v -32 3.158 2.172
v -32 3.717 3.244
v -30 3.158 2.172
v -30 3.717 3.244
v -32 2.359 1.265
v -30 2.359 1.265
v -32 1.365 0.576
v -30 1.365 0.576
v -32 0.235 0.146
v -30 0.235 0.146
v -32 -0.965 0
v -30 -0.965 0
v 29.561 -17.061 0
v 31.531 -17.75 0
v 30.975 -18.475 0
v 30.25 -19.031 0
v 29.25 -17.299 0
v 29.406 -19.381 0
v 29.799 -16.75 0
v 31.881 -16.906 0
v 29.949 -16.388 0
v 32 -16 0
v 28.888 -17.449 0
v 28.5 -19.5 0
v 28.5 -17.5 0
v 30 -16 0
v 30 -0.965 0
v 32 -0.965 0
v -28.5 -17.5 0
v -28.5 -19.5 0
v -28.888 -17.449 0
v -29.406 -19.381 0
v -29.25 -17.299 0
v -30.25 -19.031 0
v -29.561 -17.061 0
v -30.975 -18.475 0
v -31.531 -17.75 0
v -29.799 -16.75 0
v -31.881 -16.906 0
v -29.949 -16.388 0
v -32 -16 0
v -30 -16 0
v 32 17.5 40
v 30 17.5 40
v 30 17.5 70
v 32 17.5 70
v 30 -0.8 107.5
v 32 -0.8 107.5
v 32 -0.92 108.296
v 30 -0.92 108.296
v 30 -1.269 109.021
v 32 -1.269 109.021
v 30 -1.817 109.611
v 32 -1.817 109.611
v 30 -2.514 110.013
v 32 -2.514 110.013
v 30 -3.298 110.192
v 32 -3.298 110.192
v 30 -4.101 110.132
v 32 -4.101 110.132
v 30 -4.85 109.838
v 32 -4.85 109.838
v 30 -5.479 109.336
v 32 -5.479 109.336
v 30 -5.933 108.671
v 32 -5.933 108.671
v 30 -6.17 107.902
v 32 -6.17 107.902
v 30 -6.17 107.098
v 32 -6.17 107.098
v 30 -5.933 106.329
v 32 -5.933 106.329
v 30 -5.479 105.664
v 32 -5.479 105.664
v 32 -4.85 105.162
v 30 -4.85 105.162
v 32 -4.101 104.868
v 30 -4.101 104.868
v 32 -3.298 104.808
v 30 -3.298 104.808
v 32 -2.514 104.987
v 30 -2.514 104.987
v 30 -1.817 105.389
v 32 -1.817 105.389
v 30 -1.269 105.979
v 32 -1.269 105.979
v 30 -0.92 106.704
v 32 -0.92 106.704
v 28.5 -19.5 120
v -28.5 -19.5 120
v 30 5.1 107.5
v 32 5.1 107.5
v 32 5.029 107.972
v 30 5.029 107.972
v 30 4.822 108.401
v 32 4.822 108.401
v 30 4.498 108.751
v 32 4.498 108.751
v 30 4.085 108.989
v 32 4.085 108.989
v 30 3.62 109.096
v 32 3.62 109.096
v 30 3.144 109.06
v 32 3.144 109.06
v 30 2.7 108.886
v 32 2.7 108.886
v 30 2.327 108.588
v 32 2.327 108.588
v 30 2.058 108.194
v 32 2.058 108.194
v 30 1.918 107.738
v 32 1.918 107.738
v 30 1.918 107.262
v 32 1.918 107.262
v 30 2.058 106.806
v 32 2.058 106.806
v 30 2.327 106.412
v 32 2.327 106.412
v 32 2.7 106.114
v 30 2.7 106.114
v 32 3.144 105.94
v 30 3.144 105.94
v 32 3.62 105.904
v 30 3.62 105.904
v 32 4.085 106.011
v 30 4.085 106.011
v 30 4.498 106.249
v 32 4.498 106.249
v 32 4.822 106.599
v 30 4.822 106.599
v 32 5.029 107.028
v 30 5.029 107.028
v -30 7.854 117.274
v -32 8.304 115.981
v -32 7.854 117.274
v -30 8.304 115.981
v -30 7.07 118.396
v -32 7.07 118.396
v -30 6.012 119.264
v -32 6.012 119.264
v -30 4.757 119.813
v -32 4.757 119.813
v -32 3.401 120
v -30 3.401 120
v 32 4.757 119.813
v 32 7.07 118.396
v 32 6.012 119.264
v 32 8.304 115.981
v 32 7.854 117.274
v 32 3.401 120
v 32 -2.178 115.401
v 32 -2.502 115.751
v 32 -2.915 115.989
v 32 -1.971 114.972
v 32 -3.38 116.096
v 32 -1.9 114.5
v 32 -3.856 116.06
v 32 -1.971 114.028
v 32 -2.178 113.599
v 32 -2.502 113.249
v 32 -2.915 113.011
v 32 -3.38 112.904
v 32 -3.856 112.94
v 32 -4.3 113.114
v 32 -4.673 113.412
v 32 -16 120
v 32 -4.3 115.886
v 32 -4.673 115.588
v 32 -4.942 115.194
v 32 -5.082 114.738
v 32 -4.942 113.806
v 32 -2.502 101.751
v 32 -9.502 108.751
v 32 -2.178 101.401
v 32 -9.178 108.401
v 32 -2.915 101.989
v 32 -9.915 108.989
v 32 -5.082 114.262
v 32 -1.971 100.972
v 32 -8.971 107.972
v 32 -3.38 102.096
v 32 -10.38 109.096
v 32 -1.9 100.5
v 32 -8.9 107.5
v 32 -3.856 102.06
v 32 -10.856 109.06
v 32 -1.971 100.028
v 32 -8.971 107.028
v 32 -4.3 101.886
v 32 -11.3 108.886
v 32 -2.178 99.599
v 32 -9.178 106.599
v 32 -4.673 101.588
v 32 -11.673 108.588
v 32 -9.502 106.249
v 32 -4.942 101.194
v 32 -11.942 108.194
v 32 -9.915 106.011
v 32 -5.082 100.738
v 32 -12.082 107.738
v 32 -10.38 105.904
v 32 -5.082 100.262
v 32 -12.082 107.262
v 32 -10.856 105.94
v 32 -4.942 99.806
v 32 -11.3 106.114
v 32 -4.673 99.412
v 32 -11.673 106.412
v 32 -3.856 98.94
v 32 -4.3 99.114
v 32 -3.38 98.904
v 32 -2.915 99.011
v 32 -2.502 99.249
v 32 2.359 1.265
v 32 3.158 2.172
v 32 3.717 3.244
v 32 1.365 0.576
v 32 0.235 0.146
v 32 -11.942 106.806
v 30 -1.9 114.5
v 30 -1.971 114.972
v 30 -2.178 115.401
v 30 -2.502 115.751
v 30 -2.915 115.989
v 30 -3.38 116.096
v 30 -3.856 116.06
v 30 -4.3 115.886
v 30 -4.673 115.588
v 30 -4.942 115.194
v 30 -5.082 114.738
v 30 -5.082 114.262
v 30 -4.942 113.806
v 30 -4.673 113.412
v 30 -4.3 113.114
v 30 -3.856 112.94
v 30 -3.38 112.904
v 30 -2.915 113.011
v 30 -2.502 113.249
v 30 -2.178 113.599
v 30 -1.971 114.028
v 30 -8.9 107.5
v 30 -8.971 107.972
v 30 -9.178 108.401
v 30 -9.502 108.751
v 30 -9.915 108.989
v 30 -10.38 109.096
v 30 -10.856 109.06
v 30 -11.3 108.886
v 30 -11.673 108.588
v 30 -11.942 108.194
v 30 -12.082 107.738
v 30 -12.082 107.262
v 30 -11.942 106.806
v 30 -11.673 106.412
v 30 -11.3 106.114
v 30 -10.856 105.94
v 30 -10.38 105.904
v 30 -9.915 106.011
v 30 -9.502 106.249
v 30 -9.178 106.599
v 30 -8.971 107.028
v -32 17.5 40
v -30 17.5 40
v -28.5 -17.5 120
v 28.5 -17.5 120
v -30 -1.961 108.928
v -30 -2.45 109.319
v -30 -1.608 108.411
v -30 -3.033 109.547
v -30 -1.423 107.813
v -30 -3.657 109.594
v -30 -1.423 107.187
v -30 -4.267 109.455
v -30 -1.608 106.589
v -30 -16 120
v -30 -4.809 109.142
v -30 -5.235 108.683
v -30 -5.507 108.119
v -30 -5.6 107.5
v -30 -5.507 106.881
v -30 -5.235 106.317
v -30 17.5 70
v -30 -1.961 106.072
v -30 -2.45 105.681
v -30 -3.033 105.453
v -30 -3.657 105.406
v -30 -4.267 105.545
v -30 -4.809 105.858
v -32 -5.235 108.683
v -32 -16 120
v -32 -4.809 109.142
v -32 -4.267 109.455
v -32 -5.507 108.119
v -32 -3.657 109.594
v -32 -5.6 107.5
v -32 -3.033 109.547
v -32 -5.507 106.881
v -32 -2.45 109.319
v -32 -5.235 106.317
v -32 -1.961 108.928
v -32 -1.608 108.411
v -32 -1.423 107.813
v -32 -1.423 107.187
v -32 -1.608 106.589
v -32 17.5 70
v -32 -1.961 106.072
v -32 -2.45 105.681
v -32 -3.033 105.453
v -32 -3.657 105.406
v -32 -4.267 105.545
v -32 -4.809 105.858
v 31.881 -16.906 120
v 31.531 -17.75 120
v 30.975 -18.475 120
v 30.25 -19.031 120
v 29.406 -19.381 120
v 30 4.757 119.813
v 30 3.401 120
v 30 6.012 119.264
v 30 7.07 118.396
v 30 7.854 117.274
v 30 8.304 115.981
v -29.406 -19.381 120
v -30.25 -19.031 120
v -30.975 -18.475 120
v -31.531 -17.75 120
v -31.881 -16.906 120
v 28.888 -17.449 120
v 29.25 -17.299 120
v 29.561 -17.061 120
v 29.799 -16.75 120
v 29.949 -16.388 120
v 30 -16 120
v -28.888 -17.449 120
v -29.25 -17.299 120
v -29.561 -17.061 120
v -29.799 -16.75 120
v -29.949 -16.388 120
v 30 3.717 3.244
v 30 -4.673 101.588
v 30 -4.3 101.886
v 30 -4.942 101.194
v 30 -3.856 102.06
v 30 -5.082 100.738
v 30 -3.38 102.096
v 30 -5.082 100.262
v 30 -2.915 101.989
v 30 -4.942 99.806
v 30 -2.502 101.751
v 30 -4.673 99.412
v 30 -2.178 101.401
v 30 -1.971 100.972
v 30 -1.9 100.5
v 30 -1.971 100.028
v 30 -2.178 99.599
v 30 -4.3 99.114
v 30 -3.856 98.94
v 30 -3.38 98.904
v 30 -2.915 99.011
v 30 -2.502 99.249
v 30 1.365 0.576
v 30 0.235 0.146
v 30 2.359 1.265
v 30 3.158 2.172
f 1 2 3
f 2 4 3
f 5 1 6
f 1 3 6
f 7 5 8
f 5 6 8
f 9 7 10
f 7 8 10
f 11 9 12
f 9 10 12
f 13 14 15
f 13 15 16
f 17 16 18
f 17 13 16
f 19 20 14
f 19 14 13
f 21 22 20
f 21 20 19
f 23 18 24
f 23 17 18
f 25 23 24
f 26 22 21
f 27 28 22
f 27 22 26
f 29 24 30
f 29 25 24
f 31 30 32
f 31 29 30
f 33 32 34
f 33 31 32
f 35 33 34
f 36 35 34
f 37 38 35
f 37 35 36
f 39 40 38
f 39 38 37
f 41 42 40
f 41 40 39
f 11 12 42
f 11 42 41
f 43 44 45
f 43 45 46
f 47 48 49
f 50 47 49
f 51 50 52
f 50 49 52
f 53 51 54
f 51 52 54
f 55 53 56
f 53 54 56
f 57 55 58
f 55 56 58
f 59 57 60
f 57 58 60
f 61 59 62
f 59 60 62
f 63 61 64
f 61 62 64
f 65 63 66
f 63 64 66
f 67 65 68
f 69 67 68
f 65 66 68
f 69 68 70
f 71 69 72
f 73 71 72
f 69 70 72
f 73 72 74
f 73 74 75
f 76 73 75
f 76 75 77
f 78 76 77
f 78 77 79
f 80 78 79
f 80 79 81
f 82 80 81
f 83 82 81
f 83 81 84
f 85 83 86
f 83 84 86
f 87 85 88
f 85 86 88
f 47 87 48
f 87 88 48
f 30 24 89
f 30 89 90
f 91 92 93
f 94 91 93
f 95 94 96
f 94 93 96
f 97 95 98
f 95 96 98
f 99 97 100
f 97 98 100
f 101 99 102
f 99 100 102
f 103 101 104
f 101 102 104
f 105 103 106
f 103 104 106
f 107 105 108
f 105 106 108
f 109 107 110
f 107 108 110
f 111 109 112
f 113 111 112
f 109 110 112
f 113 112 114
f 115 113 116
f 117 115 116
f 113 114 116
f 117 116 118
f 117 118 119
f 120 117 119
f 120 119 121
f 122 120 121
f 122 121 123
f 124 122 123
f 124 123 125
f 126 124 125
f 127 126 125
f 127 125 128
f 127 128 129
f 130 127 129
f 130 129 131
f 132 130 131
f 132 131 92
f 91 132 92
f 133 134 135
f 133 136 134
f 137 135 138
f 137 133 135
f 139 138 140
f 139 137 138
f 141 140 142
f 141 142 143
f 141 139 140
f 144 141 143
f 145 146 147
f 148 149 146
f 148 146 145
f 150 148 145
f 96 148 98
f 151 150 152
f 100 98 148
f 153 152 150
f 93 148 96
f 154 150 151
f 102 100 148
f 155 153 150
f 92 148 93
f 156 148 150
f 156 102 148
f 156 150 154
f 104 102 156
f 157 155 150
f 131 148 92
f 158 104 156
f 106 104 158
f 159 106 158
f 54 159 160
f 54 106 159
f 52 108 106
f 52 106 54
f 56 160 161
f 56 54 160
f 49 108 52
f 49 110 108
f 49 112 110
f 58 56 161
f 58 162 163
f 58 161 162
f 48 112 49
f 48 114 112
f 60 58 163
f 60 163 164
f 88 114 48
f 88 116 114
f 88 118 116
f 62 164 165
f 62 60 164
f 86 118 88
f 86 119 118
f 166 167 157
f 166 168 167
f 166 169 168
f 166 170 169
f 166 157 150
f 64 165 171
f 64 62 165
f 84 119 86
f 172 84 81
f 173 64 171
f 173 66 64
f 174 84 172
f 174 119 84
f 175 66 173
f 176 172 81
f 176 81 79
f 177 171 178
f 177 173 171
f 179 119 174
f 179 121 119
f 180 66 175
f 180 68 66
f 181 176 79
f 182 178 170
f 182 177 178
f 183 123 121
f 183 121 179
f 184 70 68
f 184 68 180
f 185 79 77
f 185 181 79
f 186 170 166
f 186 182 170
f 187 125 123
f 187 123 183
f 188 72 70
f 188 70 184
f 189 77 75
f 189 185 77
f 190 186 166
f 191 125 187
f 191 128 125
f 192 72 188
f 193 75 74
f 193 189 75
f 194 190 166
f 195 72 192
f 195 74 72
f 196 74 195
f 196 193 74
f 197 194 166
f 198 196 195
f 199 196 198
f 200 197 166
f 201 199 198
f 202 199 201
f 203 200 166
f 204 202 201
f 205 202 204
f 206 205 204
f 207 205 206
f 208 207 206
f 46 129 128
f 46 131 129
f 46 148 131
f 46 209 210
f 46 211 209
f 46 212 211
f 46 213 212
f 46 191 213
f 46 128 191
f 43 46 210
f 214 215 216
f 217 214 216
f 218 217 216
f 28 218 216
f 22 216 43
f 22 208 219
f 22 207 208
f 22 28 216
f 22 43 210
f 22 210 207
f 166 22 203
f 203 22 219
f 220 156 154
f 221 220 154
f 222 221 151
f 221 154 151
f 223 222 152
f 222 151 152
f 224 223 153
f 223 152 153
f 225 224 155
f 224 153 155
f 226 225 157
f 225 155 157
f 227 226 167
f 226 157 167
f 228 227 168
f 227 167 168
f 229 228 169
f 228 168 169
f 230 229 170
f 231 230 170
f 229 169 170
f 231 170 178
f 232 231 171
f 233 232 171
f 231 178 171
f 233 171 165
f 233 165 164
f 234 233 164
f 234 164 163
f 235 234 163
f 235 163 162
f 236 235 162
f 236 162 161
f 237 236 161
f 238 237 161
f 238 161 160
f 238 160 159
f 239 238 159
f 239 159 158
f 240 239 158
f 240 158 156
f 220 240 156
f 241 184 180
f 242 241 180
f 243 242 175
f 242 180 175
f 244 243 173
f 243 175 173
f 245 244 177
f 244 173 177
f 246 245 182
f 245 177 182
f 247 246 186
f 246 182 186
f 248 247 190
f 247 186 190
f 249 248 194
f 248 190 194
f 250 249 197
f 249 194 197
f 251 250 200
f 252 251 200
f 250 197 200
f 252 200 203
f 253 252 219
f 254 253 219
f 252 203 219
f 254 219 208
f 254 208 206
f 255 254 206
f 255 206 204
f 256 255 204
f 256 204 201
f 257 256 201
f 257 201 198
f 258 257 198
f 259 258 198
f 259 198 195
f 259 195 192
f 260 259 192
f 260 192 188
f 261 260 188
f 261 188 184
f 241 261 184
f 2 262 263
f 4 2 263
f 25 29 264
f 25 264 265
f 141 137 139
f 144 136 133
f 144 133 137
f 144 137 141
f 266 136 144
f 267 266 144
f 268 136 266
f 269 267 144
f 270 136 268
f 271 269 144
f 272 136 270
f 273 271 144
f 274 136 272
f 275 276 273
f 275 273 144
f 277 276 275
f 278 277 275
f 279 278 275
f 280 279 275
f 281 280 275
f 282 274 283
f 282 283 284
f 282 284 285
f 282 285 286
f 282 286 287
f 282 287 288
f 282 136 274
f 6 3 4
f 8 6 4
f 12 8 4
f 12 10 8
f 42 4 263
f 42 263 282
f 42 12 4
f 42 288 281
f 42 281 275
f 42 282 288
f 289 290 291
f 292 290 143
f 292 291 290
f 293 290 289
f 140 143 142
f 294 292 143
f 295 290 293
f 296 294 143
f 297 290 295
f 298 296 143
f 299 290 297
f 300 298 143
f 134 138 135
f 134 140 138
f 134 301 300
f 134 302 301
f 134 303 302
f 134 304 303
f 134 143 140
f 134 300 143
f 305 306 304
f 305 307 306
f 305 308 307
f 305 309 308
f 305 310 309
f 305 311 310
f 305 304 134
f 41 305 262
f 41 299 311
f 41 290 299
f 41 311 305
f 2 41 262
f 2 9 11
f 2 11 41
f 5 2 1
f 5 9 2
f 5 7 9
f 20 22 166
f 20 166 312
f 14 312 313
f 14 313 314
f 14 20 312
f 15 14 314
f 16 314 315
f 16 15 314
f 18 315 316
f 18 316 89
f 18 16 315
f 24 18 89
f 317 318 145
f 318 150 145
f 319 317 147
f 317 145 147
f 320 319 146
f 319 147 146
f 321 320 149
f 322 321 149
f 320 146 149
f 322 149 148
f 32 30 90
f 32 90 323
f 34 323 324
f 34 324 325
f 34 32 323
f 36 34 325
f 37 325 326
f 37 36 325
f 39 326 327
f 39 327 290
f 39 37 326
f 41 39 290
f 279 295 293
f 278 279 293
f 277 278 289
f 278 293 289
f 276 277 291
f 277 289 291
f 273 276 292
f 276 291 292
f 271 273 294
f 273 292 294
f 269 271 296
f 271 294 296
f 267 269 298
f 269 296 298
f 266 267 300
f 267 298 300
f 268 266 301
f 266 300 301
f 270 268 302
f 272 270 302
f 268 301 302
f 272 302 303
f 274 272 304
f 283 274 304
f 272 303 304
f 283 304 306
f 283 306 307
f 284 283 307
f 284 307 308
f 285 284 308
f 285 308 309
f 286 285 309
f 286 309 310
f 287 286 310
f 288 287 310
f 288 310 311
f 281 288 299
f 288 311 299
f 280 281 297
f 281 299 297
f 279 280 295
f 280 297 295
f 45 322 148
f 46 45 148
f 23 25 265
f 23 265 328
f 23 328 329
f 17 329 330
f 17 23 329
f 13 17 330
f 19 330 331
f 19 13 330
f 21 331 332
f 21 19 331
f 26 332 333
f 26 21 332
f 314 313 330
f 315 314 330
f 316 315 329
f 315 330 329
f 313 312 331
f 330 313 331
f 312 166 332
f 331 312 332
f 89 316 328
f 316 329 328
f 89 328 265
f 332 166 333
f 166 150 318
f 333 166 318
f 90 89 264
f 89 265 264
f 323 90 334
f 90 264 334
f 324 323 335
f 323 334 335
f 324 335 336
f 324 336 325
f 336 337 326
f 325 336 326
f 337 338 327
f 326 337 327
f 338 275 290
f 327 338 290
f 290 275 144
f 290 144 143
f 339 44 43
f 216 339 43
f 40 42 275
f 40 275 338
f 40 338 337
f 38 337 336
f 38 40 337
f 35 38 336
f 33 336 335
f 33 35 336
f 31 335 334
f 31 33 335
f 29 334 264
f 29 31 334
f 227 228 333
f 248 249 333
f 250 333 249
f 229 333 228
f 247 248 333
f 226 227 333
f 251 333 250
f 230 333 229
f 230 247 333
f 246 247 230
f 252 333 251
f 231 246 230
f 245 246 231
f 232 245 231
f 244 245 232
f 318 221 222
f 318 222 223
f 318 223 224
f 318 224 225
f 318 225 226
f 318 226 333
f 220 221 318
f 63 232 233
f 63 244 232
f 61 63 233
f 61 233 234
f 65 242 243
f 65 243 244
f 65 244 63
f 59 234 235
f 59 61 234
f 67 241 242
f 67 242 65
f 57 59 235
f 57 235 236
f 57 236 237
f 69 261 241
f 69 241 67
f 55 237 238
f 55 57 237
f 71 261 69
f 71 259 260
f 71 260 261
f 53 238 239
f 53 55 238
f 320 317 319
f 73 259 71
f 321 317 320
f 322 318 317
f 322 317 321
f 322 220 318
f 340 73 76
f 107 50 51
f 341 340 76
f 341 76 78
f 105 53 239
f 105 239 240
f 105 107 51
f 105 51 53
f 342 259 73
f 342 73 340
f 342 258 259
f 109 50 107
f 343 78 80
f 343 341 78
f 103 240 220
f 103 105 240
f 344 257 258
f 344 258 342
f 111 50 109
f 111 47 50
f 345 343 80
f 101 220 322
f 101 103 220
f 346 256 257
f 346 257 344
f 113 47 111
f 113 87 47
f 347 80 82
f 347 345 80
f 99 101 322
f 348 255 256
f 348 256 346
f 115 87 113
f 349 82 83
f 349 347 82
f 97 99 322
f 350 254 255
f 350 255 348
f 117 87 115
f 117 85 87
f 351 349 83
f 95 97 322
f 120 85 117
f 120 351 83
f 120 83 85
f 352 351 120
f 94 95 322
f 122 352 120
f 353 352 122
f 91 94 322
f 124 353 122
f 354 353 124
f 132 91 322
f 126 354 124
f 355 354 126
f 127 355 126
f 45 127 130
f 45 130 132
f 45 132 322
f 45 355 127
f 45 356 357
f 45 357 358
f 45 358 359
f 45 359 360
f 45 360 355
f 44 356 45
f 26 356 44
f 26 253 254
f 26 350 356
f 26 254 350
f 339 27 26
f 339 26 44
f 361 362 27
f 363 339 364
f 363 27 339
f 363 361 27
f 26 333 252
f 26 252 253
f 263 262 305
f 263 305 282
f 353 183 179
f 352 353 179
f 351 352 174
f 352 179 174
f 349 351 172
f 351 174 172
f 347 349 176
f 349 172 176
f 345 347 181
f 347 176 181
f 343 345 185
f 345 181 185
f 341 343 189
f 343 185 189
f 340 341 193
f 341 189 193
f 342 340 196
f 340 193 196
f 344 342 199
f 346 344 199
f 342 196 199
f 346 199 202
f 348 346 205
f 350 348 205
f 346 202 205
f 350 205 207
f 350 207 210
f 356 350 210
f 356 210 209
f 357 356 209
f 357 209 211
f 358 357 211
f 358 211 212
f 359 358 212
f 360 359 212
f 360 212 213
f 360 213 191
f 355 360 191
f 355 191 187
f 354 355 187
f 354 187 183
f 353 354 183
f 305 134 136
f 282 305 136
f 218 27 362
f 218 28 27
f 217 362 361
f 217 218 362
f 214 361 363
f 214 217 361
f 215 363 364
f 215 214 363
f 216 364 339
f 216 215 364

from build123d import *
from OCP.BRepFilletAPI import BRepFilletAPI_MakeChamfer

# Parameters (mm, degrees)
SM_BASE_FLANGE_1_DEPTH = 120
CUT_EXTRUDE_1_REACH    = 139.391
SKETCH_6_R             = 1.6
CHAMFER_1_SIZE         = 10
CHAMFER_1_SIZE2        = 50
SKETCH_7_R             = 2.7
CUT_EXTRUDE_2_DEPTH    = 2
SKETCH_9_R             = 2.1
CUT_EXTRUDE_3_DEPTH    = 2
CHAMFER_2_SIZE         = 40
CHAMFER_2_SIZE2        = 15
FILLET_1_R             = 5


# Sheet-metal steps are written as plain solids
with BuildPart() as part:
    # Sketch 1 → 基材-凸緣1 (new body)
    with BuildSketch(Plane.XY):
        with BuildLine():
            Line((-30, 17.5), (-30, -16))
            ThreePointArc((-30, -16), (-29.560660172, -17.060660172), (-28.5, -17.5))
            Line((-28.5, -17.5), (28.5, -17.5))
            ThreePointArc((28.5, -17.5), (29.560660172, -17.060660172), (30, -16))
            Line((30, -16), (30, 17.5))
            Line((30, 17.5), (32, 17.5))
            Line((32, 17.5), (32, -16))
            ThreePointArc((32, -16), (30.974873734, -18.474873734), (28.5, -19.5))
            Line((28.5, -19.5), (-28.5, -19.5))
            ThreePointArc((-28.5, -19.5), (-30.974873734, -18.474873734), (-32, -16))
            Line((-32, -16), (-32, 17.5))
            Line((-32, 17.5), (-30, 17.5))
        make_face()
    extrude(amount=SM_BASE_FLANGE_1_DEPTH)

    # 草圖6 → 除料-伸長1 (cut, up to next)
    with BuildSketch(Plane(origin=(32, 0, 0), x_dir=(0, 0, -1), z_dir=(1, 0, 0)), mode=Mode.PRIVATE) as cut_extrude_1_sk1:
        with Locations(Location((-107.5, 3.5, 0), (0, 0, 90))):
            Circle(SKETCH_6_R)
    cut_extrude_1_tool1 = extrude(cut_extrude_1_sk1.sketch, amount=-CUT_EXTRUDE_1_REACH, mode=Mode.PRIVATE) & part.part
    # 草圖6 → 除料-伸長1 (cut, up to next)
    with BuildSketch(Plane(origin=(32, 0, 0), x_dir=(0, 0, -1), z_dir=(1, 0, 0)), mode=Mode.PRIVATE) as cut_extrude_1_sk2:
        with Locations(Location((-100.5, -3.5, 0), (0, 0, 90))):
            Circle(SKETCH_6_R)
    cut_extrude_1_tool2 = extrude(cut_extrude_1_sk2.sketch, amount=-CUT_EXTRUDE_1_REACH, mode=Mode.PRIVATE) & part.part
    # 草圖6 → 除料-伸長1 (cut, up to next)
    with BuildSketch(Plane(origin=(32, 0, 0), x_dir=(0, 0, -1), z_dir=(1, 0, 0)), mode=Mode.PRIVATE) as cut_extrude_1_sk3:
        with Locations(Location((-107.5, -10.5, 0), (0, 0, 90))):
            Circle(SKETCH_6_R)
    cut_extrude_1_tool3 = extrude(cut_extrude_1_sk3.sketch, amount=-CUT_EXTRUDE_1_REACH, mode=Mode.PRIVATE) & part.part
    # 草圖6 → 除料-伸長1 (cut, up to next)
    with BuildSketch(Plane(origin=(32, 0, 0), x_dir=(0, 0, -1), z_dir=(1, 0, 0)), mode=Mode.PRIVATE) as cut_extrude_1_sk4:
        with Locations(Location((-114.5, -3.5, 0), (0, 0, 90))):
            Circle(SKETCH_6_R)
    cut_extrude_1_tool4 = extrude(cut_extrude_1_sk4.sketch, amount=-CUT_EXTRUDE_1_REACH, mode=Mode.PRIVATE) & part.part
    add(cut_extrude_1_tool1.solids().sort_by_distance((32, 3.5, 107.5))[0], mode=Mode.SUBTRACT)
    add(cut_extrude_1_tool2.solids().sort_by_distance((32, -3.5, 100.5))[0], mode=Mode.SUBTRACT)
    add(cut_extrude_1_tool3.solids().sort_by_distance((32, -10.5, 107.5))[0], mode=Mode.SUBTRACT)
    add(cut_extrude_1_tool4.solids().sort_by_distance((32, -3.5, 114.5))[0], mode=Mode.SUBTRACT)

    # 導角1
    chamfer_1_edges = [part.edges().sort_by_distance(p)[0] for p in [
        (-31, 17.5, 120),
        (31, 17.5, 120),
    ]]
    chamfer_1_side = [part.faces().sort_by_distance(p)[0] for p in [
        (-30.452140533, -17.952140533, 120),
    ]]
    chamfer(chamfer_1_edges, length=CHAMFER_1_SIZE, length2=CHAMFER_1_SIZE2, reference=chamfer_1_side[0])

    # 草圖7 → 除料-伸長2 (cut)
    with BuildSketch(Plane(origin=(32, 0, 0), x_dir=(0, 0, -1), z_dir=(1, 0, 0))):
        with Locations(Location((-107.5, -3.5, 0), (0, 0, 90))):
            Circle(SKETCH_7_R)
    extrude(amount=-CUT_EXTRUDE_2_DEPTH, mode=Mode.SUBTRACT)

    # 草圖9 → 除料-伸長3 (cut)
    with BuildSketch(Plane.ZY.offset(32)):
        with Locations(Location((107.5, -3.5, 0), (0, 0, 270))):
            Circle(SKETCH_9_R)
    extrude(amount=-CUT_EXTRUDE_3_DEPTH, mode=Mode.SUBTRACT)

    # 導角2: one chamfer whose edges measure the first distance from different faces: ONE call of the kernel's chamfer builder (chamfer() names one face for all edges)
    chamfer_2_edges_1 = [part.edges().sort_by_distance(p)[0] for p in [
        (-31, 17.5, 0),
    ]]
    chamfer_2_side_1 = [part.faces().sort_by_distance(p)[0] for p in [
        (-31, 17.5, 35),
    ]]
    chamfer_2_edges_2 = [part.edges().sort_by_distance(p)[0] for p in [
        (31, 17.5, 0),
    ]]
    chamfer_2_side_2 = [part.faces().sort_by_distance(p)[0] for p in [
        (31, 17.5, 35),
    ]]
    chamfer_2 = BRepFilletAPI_MakeChamfer(part.part.solid().wrapped)
    for e in chamfer_2_edges_1:
        chamfer_2.Add(CHAMFER_2_SIZE, CHAMFER_2_SIZE2, e.wrapped, chamfer_2_side_1[0].wrapped)  # the first distance lies on this face
    for e in chamfer_2_edges_2:
        chamfer_2.Add(CHAMFER_2_SIZE, CHAMFER_2_SIZE2, e.wrapped, chamfer_2_side_2[0].wrapped)  # the first distance lies on this face
    add(Compound.cast(chamfer_2.Shape()), mode=Mode.REPLACE)

    # 圓角1
    fillet_1_edges = [part.edges().sort_by_distance(p)[0] for p in [
        (-31, 2.5, 0),
        (31, 2.5, 0),
        (-31, 7.5, 120),
        (31, 7.5, 120),
    ]]
    fillet(fillet_1_edges, radius=FILLET_1_R)


solid = part.part
